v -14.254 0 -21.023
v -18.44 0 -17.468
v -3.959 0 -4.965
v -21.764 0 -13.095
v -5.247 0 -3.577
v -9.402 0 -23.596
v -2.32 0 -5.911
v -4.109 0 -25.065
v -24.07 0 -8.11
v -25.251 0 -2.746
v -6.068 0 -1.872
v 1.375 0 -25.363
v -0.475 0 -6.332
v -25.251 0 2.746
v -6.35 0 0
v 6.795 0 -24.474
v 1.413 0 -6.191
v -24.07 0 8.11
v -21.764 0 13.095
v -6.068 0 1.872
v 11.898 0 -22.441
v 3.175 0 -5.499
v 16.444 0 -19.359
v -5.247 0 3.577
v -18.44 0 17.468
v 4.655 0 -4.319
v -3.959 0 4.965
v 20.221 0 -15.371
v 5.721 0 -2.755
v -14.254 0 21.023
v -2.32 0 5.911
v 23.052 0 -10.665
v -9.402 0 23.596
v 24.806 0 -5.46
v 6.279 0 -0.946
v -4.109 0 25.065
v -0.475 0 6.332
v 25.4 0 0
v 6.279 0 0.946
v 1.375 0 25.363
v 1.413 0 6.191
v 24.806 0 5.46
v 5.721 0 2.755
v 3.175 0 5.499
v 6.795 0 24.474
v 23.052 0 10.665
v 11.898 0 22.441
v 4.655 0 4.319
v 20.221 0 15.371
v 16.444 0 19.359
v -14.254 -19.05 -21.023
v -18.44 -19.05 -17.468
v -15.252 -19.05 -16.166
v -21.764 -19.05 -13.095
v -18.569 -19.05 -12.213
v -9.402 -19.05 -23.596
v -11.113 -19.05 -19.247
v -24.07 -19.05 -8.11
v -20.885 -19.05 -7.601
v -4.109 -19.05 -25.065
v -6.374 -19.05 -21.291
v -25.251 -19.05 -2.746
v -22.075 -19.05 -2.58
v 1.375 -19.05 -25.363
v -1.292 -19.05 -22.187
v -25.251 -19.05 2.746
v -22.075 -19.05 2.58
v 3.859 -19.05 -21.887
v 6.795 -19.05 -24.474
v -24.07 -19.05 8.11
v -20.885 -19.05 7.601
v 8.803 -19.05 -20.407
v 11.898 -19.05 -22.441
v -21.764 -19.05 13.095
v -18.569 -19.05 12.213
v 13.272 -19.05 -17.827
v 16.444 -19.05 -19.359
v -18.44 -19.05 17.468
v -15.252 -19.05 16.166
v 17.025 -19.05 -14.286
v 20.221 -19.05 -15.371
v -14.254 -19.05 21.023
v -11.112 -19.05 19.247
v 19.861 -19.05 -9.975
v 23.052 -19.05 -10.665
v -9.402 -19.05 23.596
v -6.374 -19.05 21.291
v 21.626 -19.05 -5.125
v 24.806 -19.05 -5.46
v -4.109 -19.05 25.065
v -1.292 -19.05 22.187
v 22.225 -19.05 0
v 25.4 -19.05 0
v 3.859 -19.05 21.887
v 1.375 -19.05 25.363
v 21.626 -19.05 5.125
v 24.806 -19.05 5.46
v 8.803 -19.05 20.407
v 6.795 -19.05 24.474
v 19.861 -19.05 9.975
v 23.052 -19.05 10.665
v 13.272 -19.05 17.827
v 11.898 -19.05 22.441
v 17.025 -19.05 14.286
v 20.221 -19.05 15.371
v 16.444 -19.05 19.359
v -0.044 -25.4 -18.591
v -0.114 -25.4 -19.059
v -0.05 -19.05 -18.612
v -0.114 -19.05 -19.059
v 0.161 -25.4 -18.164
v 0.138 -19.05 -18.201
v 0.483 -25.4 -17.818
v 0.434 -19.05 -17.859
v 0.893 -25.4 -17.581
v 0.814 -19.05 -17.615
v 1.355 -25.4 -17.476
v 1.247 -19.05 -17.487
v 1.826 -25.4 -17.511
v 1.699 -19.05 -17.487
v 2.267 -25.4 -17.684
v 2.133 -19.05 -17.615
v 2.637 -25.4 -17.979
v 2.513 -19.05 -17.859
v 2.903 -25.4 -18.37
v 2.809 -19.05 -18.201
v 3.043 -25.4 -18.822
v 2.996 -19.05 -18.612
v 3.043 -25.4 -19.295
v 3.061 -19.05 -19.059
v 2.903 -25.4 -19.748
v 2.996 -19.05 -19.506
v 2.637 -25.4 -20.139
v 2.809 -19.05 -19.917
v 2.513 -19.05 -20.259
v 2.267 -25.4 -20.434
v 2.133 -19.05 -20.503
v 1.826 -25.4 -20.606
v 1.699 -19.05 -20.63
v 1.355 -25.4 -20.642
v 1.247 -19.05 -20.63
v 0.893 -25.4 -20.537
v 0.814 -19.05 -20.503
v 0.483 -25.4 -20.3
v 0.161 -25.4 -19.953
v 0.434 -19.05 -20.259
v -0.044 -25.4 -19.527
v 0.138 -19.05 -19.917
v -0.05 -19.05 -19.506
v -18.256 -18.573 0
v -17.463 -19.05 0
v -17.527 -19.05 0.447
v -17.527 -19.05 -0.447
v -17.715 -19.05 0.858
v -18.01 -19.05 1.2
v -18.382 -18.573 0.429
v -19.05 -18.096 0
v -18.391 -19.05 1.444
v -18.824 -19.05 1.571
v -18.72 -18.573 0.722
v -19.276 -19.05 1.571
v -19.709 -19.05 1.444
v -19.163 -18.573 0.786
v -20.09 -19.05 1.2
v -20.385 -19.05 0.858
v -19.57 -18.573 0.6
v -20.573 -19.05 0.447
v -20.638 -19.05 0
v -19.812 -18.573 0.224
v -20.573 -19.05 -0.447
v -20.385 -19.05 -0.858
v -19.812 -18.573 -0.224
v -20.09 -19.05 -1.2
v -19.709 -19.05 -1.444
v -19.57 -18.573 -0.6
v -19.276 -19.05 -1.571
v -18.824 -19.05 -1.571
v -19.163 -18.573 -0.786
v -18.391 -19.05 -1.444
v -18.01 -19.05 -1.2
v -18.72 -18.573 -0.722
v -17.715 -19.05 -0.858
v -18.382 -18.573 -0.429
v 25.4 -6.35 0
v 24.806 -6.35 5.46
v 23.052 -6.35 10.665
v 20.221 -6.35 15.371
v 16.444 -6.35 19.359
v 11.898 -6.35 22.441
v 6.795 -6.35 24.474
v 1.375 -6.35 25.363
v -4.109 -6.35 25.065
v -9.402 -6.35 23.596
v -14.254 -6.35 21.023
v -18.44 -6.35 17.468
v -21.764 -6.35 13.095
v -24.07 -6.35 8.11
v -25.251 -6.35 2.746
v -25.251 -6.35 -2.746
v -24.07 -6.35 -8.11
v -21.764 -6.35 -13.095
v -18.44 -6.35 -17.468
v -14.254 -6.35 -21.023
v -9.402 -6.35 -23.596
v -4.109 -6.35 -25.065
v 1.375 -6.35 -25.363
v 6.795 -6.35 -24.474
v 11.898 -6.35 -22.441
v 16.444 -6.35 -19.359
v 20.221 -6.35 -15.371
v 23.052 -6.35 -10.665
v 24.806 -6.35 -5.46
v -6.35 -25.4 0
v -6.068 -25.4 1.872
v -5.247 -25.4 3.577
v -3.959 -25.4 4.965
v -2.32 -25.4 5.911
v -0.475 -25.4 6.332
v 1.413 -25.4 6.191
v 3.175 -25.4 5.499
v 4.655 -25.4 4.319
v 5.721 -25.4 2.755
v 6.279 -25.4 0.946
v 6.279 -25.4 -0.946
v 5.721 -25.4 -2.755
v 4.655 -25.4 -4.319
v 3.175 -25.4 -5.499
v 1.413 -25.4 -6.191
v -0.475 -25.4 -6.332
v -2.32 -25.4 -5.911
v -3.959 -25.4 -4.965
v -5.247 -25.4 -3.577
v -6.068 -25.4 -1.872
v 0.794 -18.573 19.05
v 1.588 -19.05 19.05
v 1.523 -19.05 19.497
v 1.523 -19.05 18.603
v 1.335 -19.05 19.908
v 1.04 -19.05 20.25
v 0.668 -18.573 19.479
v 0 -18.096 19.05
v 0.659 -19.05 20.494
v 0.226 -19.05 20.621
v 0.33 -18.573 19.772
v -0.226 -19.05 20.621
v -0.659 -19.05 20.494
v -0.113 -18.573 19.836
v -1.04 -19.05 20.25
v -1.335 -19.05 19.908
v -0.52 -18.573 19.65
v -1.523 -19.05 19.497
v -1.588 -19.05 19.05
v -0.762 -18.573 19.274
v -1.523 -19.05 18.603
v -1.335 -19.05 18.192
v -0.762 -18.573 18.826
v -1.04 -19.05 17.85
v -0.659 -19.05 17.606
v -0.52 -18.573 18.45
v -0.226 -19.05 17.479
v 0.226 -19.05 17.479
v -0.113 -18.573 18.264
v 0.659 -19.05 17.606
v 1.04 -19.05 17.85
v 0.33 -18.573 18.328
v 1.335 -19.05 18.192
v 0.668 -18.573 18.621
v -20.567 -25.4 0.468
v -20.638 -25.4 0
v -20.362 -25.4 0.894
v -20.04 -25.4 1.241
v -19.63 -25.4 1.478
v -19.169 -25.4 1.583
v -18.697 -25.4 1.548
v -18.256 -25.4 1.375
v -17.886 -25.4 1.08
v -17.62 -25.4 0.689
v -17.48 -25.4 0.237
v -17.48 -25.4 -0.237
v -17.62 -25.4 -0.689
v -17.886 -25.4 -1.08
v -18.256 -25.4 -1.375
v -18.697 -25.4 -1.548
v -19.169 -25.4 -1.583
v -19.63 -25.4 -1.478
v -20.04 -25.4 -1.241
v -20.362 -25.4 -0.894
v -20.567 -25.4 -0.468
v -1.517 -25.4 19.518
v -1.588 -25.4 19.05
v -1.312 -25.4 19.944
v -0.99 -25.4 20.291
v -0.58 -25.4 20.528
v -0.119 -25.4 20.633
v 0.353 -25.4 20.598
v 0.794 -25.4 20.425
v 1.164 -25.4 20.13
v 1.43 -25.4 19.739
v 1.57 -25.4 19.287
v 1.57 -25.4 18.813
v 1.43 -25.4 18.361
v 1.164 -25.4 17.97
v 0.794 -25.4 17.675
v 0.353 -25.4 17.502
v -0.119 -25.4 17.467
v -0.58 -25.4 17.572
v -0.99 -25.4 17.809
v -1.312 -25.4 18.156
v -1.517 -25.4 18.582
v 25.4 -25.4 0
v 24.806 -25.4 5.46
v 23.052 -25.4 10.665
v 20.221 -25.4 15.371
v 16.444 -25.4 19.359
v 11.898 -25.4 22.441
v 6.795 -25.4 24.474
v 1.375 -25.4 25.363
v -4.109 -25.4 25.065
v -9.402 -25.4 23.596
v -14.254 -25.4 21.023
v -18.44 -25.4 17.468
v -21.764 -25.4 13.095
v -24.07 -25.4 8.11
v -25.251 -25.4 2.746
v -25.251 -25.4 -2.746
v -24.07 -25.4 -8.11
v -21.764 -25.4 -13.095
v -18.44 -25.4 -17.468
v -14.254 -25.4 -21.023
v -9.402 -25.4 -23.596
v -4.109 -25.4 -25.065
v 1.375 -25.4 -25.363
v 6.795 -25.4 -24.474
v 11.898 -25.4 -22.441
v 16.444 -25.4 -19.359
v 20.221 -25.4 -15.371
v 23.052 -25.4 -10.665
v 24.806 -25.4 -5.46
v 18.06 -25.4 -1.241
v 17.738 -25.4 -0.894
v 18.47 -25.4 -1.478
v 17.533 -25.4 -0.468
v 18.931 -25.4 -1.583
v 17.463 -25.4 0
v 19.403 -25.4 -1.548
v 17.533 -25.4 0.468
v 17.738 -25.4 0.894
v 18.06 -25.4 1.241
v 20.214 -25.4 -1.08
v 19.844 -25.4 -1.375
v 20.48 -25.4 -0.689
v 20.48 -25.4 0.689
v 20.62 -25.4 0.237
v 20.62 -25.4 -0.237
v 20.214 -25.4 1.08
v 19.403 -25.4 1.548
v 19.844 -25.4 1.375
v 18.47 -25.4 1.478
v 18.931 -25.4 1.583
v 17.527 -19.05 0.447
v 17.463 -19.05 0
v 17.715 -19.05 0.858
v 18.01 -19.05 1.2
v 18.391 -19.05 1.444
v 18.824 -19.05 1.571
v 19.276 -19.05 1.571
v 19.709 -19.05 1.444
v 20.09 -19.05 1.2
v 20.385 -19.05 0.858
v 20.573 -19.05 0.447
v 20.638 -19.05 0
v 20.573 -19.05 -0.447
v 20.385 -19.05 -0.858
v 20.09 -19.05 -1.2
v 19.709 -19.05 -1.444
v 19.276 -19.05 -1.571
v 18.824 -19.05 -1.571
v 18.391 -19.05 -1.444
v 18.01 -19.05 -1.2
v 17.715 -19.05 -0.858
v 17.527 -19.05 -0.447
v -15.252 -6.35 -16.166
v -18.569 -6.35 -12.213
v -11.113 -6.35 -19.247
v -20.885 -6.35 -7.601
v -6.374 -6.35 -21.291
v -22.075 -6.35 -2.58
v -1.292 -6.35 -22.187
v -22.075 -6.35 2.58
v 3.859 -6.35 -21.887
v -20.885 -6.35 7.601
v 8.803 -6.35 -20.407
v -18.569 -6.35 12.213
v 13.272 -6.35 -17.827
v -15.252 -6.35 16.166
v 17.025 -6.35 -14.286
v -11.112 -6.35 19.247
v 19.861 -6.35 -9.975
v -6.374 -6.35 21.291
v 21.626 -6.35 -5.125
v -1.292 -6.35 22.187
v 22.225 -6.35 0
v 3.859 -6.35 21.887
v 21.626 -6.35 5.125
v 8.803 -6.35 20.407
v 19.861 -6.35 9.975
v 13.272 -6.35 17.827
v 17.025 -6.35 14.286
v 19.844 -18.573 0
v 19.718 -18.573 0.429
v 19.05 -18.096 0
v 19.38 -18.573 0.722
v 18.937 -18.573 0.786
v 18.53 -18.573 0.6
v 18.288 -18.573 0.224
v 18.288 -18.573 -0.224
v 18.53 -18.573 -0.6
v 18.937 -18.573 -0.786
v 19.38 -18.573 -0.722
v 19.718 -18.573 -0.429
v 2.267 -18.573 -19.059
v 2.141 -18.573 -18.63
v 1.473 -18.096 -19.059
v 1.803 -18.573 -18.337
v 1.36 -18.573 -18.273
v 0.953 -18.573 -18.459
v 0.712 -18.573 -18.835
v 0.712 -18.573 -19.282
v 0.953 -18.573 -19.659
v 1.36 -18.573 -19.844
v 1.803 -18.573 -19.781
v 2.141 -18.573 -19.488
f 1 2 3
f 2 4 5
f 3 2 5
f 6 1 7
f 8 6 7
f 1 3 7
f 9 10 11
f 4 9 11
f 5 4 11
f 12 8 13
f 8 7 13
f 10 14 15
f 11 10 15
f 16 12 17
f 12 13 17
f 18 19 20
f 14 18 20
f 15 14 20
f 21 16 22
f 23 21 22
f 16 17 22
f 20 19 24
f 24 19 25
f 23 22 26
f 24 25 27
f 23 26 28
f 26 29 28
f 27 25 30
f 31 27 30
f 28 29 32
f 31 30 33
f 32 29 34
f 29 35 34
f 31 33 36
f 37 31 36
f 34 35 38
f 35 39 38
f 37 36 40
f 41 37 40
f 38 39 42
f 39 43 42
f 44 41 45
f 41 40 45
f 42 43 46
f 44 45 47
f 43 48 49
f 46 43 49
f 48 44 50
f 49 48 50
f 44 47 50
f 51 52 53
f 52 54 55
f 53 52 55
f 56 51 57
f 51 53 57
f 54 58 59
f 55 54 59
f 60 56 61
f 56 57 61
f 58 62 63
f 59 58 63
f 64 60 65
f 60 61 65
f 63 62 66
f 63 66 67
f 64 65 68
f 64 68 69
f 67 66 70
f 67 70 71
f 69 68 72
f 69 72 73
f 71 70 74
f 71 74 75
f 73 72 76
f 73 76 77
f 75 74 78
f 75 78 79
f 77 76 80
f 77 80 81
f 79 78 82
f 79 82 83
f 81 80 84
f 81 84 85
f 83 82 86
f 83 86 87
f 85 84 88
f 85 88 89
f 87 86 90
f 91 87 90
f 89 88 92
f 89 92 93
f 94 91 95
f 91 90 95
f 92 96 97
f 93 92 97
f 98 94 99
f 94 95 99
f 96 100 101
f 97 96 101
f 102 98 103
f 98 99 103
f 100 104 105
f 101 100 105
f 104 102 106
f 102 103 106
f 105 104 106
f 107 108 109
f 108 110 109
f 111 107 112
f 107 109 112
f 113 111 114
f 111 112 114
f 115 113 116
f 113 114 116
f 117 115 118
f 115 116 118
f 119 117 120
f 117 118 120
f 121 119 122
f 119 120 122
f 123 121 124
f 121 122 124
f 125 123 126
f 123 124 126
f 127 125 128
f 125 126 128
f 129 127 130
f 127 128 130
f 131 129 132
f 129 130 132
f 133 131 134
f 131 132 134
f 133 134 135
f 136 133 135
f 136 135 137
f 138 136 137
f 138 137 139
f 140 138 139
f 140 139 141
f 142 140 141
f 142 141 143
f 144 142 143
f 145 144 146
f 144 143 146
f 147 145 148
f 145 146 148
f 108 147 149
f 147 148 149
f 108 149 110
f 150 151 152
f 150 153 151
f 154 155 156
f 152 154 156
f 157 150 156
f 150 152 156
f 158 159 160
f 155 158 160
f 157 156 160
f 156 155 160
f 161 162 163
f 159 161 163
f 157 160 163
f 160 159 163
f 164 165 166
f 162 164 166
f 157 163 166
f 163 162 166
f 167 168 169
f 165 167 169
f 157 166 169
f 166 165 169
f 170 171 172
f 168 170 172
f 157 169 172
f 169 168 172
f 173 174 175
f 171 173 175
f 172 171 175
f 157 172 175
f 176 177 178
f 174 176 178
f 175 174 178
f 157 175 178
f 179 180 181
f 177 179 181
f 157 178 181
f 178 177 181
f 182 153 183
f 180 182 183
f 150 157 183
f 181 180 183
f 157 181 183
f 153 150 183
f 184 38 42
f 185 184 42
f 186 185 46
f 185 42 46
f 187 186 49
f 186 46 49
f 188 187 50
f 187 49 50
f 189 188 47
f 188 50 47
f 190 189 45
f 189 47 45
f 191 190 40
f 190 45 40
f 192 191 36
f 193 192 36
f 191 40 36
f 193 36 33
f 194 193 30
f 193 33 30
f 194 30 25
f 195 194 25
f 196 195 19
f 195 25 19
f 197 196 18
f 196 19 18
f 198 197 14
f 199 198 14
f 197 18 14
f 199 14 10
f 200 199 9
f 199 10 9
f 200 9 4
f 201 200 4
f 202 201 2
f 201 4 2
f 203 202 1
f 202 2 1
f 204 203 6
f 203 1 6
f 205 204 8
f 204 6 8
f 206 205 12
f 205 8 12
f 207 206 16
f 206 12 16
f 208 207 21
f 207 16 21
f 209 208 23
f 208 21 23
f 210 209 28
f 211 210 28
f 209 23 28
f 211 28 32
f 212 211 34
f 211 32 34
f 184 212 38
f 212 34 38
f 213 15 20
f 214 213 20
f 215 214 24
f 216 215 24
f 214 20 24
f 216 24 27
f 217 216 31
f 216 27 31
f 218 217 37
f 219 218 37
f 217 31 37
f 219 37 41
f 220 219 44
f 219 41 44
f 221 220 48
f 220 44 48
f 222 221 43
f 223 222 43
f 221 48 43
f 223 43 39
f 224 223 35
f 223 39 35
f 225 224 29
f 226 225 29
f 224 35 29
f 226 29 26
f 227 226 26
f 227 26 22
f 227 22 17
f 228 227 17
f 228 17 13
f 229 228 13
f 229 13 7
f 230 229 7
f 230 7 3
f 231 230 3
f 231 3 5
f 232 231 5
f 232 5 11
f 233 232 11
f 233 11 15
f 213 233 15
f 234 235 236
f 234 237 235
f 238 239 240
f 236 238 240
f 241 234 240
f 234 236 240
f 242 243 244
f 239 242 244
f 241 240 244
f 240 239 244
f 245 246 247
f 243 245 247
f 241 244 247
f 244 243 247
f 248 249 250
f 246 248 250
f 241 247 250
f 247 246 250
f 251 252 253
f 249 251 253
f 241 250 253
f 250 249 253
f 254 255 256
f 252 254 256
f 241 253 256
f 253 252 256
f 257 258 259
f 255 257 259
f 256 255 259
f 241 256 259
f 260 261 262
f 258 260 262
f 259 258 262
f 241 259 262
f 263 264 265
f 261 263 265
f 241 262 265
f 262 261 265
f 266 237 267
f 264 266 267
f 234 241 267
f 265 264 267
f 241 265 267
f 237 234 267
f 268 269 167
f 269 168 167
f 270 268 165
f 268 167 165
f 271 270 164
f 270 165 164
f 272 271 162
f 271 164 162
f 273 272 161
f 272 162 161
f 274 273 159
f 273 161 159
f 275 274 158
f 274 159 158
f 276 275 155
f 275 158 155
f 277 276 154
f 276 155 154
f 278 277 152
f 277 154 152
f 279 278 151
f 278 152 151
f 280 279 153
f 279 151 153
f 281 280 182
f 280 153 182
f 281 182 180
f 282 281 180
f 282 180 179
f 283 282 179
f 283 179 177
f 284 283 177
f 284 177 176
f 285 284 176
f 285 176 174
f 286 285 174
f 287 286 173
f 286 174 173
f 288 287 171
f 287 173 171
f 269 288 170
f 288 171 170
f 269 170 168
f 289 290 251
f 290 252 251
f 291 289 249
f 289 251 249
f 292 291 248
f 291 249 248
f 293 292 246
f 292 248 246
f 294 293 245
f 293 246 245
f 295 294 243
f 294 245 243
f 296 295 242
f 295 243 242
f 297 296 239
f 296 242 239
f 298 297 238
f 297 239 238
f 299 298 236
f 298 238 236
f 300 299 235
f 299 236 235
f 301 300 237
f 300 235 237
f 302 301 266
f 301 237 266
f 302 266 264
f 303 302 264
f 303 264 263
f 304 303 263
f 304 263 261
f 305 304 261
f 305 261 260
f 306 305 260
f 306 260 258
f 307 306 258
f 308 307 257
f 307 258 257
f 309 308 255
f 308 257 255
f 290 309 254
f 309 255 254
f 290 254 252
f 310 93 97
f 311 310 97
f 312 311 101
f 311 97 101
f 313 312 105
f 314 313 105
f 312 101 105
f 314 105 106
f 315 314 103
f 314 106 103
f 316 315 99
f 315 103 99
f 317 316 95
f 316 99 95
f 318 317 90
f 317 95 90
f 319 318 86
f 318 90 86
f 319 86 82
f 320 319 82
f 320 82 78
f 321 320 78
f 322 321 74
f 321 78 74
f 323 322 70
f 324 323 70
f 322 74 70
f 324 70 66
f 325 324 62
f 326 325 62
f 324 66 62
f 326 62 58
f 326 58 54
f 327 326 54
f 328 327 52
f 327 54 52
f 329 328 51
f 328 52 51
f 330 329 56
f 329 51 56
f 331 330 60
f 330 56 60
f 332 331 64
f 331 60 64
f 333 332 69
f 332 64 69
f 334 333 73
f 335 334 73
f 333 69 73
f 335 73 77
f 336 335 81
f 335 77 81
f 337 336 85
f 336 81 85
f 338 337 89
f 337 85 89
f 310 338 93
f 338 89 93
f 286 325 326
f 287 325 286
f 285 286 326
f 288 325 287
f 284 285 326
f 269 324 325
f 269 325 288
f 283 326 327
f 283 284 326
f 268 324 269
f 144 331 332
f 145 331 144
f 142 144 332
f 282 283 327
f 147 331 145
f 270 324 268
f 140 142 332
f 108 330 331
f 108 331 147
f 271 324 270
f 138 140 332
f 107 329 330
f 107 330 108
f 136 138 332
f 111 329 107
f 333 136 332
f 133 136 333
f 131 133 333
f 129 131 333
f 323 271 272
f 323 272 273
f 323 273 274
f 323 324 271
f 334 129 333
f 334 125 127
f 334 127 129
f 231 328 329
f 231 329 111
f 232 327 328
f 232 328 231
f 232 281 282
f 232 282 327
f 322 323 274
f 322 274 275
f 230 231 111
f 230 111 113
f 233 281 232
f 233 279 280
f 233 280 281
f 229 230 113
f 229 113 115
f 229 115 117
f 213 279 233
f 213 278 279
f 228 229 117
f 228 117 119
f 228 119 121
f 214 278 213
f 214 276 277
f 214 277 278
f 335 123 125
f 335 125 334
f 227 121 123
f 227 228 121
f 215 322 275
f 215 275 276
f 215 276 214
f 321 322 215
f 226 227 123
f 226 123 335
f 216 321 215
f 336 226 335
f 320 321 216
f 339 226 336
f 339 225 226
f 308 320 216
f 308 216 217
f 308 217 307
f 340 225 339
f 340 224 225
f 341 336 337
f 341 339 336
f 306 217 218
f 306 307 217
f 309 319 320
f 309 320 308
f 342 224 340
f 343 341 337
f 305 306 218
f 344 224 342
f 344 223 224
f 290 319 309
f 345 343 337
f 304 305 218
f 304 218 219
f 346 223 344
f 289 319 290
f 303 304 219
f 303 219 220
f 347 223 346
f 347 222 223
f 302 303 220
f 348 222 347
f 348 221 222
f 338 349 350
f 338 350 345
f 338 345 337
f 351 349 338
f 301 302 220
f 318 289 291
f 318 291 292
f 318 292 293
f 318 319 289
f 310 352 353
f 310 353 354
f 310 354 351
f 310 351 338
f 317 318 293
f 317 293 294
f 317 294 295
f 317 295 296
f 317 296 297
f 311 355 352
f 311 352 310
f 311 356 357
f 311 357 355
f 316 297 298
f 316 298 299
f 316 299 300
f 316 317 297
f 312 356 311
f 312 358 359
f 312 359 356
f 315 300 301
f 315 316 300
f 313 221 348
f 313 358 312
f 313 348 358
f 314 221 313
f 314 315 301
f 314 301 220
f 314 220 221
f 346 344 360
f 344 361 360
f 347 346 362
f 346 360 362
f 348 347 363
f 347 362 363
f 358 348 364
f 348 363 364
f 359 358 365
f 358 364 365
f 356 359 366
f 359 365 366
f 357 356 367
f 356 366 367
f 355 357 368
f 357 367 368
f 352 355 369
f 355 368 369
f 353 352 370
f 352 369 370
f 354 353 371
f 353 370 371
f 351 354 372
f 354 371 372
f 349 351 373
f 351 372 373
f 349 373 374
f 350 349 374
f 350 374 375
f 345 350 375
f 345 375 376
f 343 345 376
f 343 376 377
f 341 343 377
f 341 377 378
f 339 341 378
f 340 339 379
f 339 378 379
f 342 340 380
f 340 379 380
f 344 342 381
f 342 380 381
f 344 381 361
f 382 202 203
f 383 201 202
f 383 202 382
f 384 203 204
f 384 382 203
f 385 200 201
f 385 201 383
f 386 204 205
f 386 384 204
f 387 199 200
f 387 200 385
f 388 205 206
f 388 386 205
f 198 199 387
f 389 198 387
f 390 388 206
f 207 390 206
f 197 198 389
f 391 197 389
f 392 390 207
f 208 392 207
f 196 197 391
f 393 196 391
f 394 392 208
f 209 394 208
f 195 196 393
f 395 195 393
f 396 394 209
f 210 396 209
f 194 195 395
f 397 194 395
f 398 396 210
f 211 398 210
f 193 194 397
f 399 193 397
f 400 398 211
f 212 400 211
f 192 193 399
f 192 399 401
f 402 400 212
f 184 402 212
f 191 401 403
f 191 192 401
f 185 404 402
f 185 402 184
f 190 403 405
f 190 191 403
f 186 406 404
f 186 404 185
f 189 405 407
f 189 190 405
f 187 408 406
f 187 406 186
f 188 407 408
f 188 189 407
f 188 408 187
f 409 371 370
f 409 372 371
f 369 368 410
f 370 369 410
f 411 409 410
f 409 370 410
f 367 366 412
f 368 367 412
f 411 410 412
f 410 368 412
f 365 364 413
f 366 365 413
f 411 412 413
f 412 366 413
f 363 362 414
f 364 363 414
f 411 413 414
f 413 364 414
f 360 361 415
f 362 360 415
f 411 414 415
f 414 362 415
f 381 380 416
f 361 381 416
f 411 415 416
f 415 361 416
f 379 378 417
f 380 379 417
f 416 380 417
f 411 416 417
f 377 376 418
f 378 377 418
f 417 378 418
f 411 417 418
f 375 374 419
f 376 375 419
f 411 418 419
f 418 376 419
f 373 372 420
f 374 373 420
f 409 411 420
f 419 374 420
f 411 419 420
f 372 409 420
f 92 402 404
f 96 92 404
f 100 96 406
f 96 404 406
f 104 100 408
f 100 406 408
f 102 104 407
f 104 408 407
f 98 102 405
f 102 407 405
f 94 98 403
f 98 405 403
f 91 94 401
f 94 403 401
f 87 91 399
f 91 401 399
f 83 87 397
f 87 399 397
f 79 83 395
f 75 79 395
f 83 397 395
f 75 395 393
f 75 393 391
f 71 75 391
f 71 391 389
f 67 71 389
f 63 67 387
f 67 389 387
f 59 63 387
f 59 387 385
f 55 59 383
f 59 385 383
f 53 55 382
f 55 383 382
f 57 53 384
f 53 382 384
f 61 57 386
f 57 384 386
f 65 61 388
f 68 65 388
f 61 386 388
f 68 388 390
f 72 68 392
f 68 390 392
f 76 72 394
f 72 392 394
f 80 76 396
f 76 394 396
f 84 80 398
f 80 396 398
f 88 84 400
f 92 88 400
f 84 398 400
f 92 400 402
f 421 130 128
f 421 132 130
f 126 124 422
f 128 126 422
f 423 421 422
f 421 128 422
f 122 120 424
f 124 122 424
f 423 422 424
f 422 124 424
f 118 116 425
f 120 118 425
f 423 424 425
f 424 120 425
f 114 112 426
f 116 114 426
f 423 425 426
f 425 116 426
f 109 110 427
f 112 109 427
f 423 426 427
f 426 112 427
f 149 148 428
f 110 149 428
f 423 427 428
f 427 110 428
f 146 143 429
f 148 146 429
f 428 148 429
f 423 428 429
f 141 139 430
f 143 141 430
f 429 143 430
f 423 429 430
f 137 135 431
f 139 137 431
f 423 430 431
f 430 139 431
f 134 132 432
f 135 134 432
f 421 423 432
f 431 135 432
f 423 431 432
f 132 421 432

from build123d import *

# Parameters (mm, degrees)
F0_R      = 25.4
F1_DEPTH  = 6.35
F2_R      = 22.225
F3_DEPTH  = 12.7
F4_R      = 25.4
F5_DEPTH  = 6.35
F6_R      = 1.5875
F6_R_2    = 6.35
F7_DEPTH  = 89
F9_D      = 12.7
F11_D     = 3.175
F11_DEPTH = 6.35
F11_TIP   = 0.9538662327
F13_D     = 3.175
F13_DEPTH = 6.35
F13_TIP   = 0.9538662327
F15_D     = 3.175
F15_DEPTH = 6.35
F15_TIP   = 0.9538662327
F17_D     = 3.175
F17_DEPTH = 6.35
F17_TIP   = 0.9538662327


# Not quite as in the source:
# - an extrude ends at something that could not be found from the text; its depth is read off the source's solid


with BuildPart() as f1:
    # F0 (on Front) → F1 (new body)
    with BuildSketch(Plane.XZ):
        Circle(F0_R)
    extrude(amount=F1_DEPTH)

    # F2 (on face) → F3 (join)
    with BuildSketch(Plane.XZ.offset(6.35)):
        Circle(F2_R)
    extrude(amount=F3_DEPTH)

    # F4 (on face) → F5 (join)
    with BuildSketch(Plane.XZ.offset(19.05)):
        Circle(F4_R)
    extrude(amount=F5_DEPTH)

    # F6 (on face) → F7 (cut, through all)
    with BuildSketch(Plane.XZ.offset(25.4)):
        with Locations((0, -20.6375)):
            Circle(F6_R)
        with Locations((20.6375, 0)):
            Circle(F6_R)
        with Locations((0, 20.6375)):
            Circle(F6_R)
        with Locations((-20.6375, 0)):
            Circle(F6_R)
        Circle(F6_R_2)
    extrude(amount=F7_DEPTH, mode=Mode.SUBTRACT)

    # F9 (through all)
    with Locations(Plane.XZ.offset(25.4)):
        with Locations((0, 0)):
            Hole(F9_D / 2)

    # F11
    with Locations(Plane.XZ.offset(25.4)):
        with Locations((19.05, 0)):
            Hole(F11_D / 2, depth=F11_DEPTH)
            with Locations((0, 0, -(F11_DEPTH + F11_TIP / 2))):  # 118° drill point
                Cone(0, F11_D / 2, F11_TIP, mode=Mode.SUBTRACT)

    # F13
    with Locations(Plane.XZ.offset(25.4)):
        with Locations((0, 19.05)):
            Hole(F13_D / 2, depth=F13_DEPTH)
            with Locations((0, 0, -(F13_DEPTH + F13_TIP / 2))):  # 118° drill point
                Cone(0, F13_D / 2, F13_TIP, mode=Mode.SUBTRACT)

    # F15
    with Locations(Plane.XZ.offset(25.4)):
        with Locations((-19.05, 0)):
            Hole(F15_D / 2, depth=F15_DEPTH)
            with Locations((0, 0, -(F15_DEPTH + F15_TIP / 2))):  # 118° drill point
                Cone(0, F15_D / 2, F15_TIP, mode=Mode.SUBTRACT)

    # F17
    with Locations(Plane.XZ.offset(25.4)):
        with Locations((1.4731416013, -19.0587695688)):
            Hole(F17_D / 2, depth=F17_DEPTH)
            with Locations((0, 0, -(F17_DEPTH + F17_TIP / 2))):  # 118° drill point
                Cone(0, F17_D / 2, F17_TIP, mode=Mode.SUBTRACT)


solid = f1.part
